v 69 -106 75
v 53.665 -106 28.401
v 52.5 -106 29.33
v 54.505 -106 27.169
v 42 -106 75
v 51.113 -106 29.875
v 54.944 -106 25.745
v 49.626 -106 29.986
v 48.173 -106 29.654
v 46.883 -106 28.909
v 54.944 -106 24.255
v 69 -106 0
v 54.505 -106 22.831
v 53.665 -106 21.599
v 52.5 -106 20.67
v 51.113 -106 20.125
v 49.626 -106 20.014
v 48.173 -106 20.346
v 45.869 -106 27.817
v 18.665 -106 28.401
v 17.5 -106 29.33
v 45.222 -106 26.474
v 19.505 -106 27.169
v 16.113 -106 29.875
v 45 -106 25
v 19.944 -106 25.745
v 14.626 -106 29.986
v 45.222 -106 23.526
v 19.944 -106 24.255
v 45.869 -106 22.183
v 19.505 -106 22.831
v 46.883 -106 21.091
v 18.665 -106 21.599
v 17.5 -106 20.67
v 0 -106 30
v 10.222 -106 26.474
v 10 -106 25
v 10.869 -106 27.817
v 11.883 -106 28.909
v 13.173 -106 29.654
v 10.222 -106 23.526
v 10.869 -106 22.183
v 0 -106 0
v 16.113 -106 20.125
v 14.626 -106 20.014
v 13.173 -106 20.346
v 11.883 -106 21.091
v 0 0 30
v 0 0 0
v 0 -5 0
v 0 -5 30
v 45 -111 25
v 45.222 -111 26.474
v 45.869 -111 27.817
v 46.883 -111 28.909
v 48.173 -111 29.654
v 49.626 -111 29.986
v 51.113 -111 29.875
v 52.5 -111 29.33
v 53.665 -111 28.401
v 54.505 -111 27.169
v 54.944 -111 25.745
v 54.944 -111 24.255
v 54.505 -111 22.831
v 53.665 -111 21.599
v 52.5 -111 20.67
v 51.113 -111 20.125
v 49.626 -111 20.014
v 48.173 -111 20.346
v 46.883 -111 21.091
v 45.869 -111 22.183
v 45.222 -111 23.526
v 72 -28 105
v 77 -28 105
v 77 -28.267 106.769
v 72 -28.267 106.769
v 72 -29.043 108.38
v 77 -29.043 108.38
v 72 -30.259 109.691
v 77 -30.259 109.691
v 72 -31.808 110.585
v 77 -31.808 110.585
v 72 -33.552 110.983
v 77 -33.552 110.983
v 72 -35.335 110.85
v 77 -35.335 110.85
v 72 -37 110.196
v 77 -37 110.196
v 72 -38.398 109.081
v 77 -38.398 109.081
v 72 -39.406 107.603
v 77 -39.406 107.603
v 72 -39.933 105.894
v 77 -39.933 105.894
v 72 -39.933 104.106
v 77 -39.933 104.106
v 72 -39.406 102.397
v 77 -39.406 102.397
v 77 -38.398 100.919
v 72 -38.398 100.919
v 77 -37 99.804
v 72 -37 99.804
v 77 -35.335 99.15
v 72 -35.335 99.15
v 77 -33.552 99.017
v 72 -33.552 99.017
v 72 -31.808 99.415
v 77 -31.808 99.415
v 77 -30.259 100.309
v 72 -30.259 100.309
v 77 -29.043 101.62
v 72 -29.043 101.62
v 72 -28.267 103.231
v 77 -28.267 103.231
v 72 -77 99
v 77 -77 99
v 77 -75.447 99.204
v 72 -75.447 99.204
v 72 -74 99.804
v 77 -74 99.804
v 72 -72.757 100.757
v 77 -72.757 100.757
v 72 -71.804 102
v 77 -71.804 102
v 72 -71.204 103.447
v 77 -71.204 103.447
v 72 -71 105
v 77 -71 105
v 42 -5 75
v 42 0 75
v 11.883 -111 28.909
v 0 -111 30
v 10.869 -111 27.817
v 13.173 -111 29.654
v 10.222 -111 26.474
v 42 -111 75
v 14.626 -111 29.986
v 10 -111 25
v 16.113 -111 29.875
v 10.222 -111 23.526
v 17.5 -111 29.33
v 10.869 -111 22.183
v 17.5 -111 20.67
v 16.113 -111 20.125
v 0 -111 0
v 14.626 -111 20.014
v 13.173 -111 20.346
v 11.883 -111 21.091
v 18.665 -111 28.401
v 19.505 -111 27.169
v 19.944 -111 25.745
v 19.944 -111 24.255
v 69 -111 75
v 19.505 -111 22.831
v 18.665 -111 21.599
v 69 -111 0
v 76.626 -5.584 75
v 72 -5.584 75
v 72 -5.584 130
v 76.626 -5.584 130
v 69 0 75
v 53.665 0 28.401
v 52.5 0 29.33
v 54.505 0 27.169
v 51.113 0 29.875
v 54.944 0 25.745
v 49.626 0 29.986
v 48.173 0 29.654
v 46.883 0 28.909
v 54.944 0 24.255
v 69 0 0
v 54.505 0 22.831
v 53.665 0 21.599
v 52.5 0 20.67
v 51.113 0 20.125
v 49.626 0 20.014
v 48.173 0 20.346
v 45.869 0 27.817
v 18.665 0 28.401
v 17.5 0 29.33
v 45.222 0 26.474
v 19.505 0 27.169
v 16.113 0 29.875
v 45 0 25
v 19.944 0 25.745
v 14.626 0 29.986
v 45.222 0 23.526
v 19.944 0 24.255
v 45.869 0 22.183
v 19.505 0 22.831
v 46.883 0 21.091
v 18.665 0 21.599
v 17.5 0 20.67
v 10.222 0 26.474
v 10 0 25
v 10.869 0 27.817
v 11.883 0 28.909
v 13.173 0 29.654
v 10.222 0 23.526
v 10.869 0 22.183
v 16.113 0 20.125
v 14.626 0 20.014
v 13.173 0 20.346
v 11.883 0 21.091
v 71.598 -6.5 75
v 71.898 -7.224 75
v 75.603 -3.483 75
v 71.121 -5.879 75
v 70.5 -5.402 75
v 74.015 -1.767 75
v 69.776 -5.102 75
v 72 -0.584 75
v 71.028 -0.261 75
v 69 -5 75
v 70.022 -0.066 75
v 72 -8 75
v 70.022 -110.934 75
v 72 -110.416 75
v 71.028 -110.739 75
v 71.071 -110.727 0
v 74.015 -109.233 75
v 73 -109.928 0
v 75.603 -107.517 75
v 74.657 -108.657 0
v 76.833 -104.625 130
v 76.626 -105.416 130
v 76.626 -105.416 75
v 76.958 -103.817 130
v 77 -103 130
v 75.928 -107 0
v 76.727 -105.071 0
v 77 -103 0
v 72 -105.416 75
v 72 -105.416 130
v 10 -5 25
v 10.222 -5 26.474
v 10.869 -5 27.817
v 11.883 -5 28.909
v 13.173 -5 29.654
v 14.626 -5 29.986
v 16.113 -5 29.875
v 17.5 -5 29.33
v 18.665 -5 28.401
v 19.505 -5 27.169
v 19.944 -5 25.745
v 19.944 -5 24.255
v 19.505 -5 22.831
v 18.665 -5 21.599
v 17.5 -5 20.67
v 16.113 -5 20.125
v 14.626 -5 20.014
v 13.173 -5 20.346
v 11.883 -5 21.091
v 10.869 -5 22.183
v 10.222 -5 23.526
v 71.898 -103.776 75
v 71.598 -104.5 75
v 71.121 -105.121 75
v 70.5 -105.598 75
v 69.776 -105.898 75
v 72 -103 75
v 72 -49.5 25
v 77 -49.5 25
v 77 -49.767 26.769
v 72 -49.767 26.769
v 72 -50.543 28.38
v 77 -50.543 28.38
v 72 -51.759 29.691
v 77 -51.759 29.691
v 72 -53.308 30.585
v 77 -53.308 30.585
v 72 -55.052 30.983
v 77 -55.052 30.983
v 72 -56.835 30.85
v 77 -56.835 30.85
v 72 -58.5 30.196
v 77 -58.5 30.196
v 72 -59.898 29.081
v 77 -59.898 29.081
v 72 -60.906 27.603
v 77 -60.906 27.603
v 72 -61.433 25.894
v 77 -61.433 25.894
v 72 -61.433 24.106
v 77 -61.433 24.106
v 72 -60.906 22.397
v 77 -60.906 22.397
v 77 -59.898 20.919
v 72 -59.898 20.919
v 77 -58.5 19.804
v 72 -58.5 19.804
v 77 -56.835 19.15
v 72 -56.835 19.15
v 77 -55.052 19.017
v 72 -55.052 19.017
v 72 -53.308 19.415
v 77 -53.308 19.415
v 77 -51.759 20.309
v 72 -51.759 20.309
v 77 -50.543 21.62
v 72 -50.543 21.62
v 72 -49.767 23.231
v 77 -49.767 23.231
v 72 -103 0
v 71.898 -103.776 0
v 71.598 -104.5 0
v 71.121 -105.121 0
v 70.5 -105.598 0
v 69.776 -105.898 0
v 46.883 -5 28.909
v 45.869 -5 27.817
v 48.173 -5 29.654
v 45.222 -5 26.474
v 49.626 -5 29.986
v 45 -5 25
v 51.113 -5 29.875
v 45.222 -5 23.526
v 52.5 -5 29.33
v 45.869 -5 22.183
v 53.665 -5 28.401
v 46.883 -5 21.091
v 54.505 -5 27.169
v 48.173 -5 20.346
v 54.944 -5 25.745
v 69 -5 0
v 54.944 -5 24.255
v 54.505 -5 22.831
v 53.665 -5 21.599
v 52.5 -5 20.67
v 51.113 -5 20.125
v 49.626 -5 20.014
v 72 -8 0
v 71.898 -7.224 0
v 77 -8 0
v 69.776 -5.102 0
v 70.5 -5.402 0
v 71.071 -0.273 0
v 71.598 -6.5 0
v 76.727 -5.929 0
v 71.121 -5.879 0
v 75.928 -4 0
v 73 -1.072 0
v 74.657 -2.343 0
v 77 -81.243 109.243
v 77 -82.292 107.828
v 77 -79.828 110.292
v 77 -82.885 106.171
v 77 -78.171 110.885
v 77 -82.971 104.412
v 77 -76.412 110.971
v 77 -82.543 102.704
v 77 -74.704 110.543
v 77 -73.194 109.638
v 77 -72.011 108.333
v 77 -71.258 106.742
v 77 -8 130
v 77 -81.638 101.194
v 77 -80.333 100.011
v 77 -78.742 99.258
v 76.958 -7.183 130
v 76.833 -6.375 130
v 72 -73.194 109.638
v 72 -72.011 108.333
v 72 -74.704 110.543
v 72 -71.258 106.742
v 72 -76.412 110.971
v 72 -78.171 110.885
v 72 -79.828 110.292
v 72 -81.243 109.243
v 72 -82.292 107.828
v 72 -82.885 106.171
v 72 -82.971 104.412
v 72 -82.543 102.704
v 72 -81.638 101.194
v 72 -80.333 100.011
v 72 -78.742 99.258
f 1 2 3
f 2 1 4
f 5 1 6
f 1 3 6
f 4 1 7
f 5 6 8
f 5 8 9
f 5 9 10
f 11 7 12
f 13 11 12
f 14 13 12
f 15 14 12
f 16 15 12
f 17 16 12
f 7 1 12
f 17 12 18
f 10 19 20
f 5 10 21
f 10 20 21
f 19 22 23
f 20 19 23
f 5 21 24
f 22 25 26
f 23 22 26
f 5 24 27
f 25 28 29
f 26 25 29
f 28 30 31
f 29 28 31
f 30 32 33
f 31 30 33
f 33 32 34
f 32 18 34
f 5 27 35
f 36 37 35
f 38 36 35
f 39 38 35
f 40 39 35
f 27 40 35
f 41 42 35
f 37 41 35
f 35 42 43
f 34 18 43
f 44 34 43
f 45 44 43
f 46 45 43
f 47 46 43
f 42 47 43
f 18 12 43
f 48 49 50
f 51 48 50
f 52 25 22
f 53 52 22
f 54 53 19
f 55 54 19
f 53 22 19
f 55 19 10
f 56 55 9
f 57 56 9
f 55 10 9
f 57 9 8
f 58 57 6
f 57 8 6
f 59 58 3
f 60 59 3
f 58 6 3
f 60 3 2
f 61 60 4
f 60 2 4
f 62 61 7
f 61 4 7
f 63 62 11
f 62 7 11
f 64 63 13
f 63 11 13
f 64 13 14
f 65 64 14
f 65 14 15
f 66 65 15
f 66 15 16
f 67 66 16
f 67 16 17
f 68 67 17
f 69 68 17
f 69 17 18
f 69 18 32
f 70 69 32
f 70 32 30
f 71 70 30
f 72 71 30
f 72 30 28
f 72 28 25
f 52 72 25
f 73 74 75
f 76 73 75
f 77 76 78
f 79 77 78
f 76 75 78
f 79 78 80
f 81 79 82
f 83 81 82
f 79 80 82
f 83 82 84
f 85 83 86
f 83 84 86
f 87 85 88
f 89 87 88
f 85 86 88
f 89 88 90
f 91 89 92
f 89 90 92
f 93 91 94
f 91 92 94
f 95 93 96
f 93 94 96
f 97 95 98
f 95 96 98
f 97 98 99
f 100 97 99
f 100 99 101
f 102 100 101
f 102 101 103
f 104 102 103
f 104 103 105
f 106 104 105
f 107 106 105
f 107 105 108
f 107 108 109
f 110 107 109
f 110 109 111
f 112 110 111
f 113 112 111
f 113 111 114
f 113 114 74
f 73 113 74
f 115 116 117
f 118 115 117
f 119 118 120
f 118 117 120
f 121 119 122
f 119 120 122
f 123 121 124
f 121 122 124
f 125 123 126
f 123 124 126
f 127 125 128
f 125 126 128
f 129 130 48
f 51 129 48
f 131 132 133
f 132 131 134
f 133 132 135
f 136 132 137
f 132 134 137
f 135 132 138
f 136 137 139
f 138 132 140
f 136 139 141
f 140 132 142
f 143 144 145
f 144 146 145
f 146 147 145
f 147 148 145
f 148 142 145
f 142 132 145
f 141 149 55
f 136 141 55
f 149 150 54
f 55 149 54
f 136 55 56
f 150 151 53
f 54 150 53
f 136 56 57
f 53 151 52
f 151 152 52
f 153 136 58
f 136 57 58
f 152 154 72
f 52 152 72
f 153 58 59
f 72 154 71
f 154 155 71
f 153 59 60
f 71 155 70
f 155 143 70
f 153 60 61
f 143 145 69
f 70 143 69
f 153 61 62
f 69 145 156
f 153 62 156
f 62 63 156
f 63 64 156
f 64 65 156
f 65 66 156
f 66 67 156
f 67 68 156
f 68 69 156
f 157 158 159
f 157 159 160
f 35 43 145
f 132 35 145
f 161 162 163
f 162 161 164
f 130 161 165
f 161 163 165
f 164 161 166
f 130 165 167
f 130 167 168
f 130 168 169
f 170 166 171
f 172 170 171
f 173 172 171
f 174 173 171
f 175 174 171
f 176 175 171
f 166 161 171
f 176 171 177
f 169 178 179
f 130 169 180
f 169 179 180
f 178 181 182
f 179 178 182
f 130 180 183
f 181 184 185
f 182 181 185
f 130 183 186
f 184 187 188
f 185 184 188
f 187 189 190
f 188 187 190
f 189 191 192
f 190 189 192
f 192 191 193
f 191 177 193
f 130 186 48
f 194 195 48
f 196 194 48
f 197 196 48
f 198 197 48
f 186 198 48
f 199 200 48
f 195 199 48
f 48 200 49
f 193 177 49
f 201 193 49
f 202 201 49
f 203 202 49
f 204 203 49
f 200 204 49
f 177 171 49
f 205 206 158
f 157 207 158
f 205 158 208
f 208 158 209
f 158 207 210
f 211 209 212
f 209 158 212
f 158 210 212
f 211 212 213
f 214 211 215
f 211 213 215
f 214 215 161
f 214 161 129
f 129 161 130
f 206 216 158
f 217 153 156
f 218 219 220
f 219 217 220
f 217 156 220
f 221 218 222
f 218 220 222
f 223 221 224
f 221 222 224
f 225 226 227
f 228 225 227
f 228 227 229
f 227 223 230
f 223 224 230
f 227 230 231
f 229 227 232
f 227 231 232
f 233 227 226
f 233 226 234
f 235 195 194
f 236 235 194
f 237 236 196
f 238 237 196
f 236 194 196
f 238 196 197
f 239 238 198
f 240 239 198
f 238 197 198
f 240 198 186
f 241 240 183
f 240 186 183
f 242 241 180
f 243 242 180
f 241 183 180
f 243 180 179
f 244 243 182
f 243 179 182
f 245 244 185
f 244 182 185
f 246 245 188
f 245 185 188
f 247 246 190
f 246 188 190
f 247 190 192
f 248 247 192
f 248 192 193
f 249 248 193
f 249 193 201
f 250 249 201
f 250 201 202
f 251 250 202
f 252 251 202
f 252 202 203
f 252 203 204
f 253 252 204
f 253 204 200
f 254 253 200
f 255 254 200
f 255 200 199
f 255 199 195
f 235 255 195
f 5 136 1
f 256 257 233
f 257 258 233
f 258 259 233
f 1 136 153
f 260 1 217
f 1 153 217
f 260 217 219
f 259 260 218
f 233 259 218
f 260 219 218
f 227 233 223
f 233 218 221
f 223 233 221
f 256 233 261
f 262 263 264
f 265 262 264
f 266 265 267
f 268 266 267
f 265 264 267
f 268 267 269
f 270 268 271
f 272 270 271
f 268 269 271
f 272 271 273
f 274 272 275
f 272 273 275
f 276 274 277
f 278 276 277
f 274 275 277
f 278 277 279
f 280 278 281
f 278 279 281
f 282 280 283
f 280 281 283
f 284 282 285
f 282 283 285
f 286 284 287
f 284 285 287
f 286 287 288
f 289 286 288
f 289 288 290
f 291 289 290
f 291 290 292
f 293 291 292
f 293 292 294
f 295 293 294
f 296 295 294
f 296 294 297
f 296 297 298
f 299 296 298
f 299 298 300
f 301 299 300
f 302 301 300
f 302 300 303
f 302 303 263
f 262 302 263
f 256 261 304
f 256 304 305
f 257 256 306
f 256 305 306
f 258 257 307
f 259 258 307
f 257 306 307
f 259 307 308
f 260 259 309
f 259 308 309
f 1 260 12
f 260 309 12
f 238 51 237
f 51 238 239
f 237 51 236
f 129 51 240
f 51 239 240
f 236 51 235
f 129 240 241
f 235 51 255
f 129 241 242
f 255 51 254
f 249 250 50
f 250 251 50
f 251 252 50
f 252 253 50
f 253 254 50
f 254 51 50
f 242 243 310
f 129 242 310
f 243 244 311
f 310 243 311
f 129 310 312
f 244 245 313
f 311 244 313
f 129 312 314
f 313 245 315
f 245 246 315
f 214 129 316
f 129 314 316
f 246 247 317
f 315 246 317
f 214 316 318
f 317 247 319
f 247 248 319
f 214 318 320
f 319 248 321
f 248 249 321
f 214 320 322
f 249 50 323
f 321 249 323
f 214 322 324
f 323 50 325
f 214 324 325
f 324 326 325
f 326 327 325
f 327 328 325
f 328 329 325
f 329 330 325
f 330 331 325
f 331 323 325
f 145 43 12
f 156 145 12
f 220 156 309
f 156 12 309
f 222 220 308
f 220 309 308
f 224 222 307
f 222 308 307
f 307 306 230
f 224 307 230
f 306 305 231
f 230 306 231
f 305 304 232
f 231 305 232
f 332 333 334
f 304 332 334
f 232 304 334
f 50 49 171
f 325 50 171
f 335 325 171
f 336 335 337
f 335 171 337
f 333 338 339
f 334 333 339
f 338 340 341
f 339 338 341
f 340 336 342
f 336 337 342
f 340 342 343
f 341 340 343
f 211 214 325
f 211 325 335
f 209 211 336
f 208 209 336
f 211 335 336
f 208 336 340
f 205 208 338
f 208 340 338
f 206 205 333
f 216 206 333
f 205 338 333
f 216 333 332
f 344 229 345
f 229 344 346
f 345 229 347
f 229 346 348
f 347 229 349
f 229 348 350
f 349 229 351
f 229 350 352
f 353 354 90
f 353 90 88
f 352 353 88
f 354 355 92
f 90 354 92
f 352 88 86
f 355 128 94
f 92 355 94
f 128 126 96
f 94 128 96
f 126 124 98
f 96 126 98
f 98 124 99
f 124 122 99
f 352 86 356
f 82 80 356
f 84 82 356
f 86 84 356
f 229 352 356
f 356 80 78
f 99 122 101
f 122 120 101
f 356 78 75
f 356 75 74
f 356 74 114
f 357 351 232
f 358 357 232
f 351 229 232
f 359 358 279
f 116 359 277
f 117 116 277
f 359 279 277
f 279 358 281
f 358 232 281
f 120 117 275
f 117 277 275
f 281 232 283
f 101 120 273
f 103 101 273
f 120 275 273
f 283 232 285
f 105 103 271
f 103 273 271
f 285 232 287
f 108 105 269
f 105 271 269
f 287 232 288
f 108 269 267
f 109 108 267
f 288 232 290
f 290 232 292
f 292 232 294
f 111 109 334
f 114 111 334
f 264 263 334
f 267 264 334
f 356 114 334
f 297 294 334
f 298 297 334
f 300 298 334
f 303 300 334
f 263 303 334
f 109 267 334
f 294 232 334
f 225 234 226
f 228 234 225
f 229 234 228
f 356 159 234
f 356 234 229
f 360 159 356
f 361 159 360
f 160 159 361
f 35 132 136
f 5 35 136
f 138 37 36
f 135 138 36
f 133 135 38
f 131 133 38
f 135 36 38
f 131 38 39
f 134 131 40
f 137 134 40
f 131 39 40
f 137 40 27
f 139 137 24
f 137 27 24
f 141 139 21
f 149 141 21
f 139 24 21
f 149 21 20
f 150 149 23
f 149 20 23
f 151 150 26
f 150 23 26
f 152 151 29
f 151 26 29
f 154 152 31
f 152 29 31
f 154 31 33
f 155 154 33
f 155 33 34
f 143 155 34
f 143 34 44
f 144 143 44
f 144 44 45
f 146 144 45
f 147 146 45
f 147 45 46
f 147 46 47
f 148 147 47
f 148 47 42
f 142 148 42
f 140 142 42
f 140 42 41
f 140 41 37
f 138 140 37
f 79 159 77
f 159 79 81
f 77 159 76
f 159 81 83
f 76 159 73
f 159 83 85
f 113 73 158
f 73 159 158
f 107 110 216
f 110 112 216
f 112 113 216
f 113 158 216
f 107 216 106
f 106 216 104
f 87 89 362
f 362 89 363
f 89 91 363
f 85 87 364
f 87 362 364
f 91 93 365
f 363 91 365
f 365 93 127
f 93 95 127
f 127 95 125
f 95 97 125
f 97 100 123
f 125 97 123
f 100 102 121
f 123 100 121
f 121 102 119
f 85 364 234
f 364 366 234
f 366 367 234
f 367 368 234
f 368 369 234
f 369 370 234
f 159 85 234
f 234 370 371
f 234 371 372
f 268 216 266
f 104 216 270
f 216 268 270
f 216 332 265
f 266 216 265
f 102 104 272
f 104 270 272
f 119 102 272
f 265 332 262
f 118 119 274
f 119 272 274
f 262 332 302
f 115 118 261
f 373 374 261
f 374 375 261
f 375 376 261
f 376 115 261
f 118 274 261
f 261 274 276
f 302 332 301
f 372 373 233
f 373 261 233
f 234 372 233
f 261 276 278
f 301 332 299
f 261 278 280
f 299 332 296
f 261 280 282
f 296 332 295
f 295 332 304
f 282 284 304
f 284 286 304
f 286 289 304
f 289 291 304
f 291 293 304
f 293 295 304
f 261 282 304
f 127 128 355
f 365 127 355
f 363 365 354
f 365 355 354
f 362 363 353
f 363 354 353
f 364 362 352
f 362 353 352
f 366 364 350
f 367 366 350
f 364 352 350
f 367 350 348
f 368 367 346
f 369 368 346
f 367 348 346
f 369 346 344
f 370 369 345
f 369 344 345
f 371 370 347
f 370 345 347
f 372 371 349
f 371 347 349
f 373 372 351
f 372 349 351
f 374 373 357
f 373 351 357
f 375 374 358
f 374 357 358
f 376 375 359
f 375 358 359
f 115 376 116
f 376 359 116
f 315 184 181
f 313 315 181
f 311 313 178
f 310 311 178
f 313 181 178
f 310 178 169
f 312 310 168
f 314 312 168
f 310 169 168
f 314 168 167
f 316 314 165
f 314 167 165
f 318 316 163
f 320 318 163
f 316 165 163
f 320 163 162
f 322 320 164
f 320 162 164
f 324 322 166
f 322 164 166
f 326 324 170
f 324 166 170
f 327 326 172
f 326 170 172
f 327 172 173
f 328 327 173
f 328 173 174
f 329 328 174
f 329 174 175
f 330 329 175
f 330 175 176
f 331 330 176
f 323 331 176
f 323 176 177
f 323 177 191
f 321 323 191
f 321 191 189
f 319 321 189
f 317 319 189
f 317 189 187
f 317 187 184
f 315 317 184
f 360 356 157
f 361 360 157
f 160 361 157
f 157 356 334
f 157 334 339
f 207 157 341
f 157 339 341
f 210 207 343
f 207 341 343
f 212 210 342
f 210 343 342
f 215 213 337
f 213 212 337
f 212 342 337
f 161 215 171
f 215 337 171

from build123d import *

# Parameters (mm, degrees)
F1_DEPTH  = 130
F3_DEPTH  = 25
F5_DEPTH  = 25
F6_R      = 5
F7_DEPTH  = 200
F8_R      = 6
F9_DEPTH  = 25
F11_DEPTH = 55
F12_R     = 6
F13_DEPTH = 25


with BuildPart() as f1:
    # F0 (on Top) → F1 (new body)
    with BuildSketch(Plane.XY):
        with BuildLine():
            Line((69, 0), (0, 0))
            Line((0, 0), (0, -5))
            Line((0, -5), (69, -5))
            ThreePointArc((69, -5), (71.1213203436, -5.8786796564), (72, -8))
            Line((72, -8), (72, -32.9701863229))
            Line((72, -32.9701863229), (72, -103))
            ThreePointArc((72, -103), (71.1213203436, -105.1213203436), (69, -106))
            Line((69, -106), (0, -106))
            Line((0, -106), (0, -111))
            Line((0, -111), (69, -111))
            ThreePointArc((69, -111), (74.6568542495, -108.6568542495), (77, -103))
            Line((77, -103), (77, -8))
            ThreePointArc((77, -8), (74.6568542495, -2.3431457505), (69, 0))
        make_face()
    extrude(amount=F1_DEPTH)

    # F2 (on face) → F3 (cut)
    with BuildSketch(Plane(origin=(0, 0, 0), x_dir=(-1, 0, 0), z_dir=(0, 1, 0))):
        Polygon((0, 30), (0, 130), (-72, 130), (-72, 75), (-42, 75), align=None)
    extrude(amount=-F3_DEPTH, mode=Mode.SUBTRACT)

    # F4 (on face) → F5 (cut)
    with BuildSketch(Plane.XZ.offset(111)):
        Polygon((72, 130), (0, 130), (0, 75), (0, 30), (42, 75), (72, 75), align=None)
    extrude(amount=-F5_DEPTH, mode=Mode.SUBTRACT)

    # F6 (on face) → F7 (cut)
    with BuildSketch(Plane(origin=(0, 0, 0), x_dir=(-1, 0, 0), z_dir=(0, 1, 0))):
        with Locations((-15, 25)):
            Circle(F6_R)
        with Locations((-50, 25)):
            Circle(F6_R)
    extrude(amount=-F7_DEPTH, mode=Mode.SUBTRACT)

    # F8 (on face) → F9 (cut)
    with BuildSketch(Plane.YZ.offset(77)):
        with Locations((-55.5, 25)):
            Circle(F8_R)
    extrude(amount=-F9_DEPTH, mode=Mode.SUBTRACT)

    # F10 (on face) → F11 (cut)
    with BuildSketch(Plane.XY.offset(130)):
        with BuildLine():
            Line((72, -5.5838015129), (76.6264005187, -5.5838015129))
            ThreePointArc((76.6264005187, -5.5838015129), (74.8719755616, -2.5667778433), (72, -0.5838015129))
            Line((72, -0.5838015129), (72, -5.5838015129))
        make_face()
        with BuildLine():
            ThreePointArc((72, -110.4161984871), (74.8719755616, -108.4332221567), (76.6264005187, -105.4161984871))
            Line((76.6264005187, -105.4161984871), (72, -105.4161984871))
            Line((72, -105.4161984871), (72, -110.4161984871))
        make_face()
    extrude(amount=-F11_DEPTH, mode=Mode.SUBTRACT)

    # F12 (on face) → F13 (cut)
    with BuildSketch(Plane.YZ.offset(77)):
        with BuildLine():
            ThreePointArc((-77, 99), (-72.7573593129, 100.7573593129), (-71, 105))
            ThreePointArc((-71, 105), (-81.2426406871, 109.2426406871), (-77, 99))
        make_face()
        with Locations((-34, 105)):
            Circle(F12_R)
    extrude(amount=-F13_DEPTH, mode=Mode.SUBTRACT)


solid = f1.part
